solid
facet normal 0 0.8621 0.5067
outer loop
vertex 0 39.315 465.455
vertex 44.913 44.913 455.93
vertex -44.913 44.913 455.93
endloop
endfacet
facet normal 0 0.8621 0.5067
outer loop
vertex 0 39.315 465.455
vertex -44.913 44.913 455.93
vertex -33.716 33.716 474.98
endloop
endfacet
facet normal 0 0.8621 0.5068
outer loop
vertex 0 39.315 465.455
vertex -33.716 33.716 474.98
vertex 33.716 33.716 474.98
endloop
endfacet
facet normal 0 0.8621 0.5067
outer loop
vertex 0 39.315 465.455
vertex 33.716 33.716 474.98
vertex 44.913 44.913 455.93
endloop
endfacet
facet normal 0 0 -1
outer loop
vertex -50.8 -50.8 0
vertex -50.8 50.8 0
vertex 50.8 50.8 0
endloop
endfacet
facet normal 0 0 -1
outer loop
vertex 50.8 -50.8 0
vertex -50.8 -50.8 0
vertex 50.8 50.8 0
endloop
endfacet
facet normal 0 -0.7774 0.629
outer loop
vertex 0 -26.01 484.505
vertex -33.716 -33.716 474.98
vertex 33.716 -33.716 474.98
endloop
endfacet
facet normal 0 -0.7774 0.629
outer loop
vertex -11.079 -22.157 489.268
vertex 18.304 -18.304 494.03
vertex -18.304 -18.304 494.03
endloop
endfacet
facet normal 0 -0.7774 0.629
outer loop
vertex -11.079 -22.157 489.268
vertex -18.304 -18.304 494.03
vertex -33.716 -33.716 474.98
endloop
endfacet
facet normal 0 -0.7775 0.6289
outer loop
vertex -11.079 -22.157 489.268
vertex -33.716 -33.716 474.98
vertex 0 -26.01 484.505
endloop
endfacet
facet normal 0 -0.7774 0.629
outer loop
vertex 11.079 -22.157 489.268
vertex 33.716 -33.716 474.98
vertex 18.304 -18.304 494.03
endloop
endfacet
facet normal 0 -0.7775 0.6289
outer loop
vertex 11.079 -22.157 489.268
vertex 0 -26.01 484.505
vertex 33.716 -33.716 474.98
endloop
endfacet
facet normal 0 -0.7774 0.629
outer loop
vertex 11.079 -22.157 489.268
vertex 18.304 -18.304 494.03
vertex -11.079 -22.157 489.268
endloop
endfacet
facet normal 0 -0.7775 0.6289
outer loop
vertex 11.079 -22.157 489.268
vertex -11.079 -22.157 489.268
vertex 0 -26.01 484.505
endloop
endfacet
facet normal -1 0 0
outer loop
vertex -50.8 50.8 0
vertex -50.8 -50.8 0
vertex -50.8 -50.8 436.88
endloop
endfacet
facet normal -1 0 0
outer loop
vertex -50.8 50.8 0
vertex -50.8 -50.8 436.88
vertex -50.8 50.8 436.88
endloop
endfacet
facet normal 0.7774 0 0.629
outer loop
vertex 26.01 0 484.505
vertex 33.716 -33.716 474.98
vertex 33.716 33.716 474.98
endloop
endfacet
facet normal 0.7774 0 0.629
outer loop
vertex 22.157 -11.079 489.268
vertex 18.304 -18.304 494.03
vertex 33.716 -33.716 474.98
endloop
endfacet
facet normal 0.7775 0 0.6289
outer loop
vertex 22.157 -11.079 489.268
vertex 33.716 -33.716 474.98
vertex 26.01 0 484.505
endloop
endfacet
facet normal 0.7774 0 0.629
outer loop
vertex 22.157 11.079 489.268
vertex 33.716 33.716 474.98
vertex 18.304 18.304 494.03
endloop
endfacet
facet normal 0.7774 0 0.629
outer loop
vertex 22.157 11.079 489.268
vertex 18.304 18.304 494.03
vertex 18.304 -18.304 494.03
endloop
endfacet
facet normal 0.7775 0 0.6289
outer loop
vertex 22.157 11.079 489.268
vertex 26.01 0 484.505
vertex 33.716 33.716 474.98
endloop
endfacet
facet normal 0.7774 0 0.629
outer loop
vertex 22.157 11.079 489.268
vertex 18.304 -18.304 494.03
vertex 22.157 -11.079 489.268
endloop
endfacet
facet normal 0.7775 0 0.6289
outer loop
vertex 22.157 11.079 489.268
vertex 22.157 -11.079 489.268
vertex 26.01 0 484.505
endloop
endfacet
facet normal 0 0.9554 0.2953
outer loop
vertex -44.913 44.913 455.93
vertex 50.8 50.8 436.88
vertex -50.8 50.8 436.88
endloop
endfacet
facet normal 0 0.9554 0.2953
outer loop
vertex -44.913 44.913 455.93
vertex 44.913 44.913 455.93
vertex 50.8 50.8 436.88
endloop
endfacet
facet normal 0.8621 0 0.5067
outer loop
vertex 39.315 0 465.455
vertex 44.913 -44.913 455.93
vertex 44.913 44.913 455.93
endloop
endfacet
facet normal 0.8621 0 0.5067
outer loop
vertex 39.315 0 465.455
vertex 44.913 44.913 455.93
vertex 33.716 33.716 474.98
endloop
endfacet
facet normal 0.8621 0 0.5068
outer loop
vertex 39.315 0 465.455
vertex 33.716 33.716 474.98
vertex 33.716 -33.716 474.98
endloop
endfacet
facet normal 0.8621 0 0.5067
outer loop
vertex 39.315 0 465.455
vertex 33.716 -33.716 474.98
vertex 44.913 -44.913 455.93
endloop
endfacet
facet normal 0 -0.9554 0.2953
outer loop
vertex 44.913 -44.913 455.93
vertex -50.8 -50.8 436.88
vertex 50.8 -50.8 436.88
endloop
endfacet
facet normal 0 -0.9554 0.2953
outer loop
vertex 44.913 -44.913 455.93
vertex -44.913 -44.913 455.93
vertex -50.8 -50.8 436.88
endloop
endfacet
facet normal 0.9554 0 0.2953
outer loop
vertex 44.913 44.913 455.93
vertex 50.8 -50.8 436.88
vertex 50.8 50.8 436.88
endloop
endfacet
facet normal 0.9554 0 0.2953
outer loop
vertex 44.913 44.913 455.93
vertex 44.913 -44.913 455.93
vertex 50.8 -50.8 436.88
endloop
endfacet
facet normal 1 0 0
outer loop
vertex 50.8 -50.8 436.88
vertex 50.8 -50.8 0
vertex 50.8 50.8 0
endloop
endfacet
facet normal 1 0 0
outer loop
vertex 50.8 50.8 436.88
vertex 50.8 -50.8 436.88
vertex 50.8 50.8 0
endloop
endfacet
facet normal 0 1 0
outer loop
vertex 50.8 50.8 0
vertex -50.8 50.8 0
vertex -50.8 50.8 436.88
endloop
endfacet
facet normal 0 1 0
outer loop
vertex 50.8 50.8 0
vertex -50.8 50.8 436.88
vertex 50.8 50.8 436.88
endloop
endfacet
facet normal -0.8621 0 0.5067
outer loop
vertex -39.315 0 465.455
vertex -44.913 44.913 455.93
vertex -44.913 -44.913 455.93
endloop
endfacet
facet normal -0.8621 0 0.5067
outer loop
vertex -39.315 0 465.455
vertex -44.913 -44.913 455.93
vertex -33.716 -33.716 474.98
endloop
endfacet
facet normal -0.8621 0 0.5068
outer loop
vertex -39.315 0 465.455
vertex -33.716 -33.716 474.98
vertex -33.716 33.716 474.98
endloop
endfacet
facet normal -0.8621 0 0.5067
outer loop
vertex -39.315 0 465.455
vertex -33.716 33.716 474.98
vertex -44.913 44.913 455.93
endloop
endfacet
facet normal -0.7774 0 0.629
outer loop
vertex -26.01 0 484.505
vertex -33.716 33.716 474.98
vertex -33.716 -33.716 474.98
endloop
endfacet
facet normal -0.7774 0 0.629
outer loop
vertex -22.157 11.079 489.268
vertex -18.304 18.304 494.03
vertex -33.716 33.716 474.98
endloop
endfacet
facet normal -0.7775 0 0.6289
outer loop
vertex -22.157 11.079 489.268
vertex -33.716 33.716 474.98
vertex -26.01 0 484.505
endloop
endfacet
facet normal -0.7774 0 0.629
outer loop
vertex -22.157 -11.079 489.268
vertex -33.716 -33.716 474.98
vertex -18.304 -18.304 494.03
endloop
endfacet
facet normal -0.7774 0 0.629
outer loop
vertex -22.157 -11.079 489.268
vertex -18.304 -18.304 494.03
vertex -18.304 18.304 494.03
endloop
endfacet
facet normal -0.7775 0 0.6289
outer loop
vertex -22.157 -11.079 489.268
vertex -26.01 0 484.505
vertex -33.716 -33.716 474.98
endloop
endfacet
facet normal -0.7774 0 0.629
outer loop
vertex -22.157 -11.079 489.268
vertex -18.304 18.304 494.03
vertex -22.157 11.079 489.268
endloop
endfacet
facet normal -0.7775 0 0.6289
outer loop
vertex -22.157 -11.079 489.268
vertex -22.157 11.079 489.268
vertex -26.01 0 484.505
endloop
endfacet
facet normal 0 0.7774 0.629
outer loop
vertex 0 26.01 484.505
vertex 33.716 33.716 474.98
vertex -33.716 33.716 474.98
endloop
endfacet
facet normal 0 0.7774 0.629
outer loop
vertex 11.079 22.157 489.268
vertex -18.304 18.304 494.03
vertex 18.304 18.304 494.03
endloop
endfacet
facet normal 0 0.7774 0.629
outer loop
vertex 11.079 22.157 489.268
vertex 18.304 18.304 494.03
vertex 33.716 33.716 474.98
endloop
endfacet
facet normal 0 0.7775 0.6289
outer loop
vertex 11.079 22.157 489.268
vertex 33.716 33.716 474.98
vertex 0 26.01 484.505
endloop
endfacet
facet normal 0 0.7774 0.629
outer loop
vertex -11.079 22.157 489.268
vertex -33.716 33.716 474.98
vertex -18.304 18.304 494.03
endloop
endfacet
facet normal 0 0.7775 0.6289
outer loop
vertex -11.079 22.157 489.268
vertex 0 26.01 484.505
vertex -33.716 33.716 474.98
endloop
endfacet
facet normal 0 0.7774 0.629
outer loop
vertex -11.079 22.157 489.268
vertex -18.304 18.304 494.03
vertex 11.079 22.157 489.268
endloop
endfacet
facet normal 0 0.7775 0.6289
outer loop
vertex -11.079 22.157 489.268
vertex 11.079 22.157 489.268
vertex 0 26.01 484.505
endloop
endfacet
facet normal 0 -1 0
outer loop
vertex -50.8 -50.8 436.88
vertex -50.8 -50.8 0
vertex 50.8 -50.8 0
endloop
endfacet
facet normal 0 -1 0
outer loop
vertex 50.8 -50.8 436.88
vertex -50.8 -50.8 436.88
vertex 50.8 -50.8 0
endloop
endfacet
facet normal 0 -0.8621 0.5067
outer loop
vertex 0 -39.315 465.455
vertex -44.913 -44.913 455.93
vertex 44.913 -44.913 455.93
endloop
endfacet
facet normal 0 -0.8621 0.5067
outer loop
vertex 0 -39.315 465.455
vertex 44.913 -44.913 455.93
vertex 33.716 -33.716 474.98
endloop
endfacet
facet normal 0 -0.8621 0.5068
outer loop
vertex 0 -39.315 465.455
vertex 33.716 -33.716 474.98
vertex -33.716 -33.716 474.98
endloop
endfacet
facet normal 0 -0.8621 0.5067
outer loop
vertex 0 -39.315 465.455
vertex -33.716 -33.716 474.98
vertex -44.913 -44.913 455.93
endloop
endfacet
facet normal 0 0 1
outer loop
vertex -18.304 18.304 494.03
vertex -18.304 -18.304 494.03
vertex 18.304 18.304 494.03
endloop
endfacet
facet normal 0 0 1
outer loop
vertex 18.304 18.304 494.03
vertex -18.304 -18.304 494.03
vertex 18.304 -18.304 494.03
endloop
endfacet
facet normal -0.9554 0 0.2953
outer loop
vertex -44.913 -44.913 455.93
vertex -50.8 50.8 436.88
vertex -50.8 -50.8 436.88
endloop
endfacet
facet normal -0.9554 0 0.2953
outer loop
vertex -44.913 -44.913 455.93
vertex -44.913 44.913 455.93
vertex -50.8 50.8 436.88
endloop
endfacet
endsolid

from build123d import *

# Parameters (mm, degrees)
SKETCH1_W           = 101.6
SKETCH1_H           = 101.6
BOSS_EXTRUDE1_DEPTH = 436.88


with BuildPart() as part:
    # Sketch1 → Boss-Extrude1 (new body)
    with BuildSketch(Plane.XY):
        Rectangle(SKETCH1_W, SKETCH1_H)
    extrude(amount=BOSS_EXTRUDE1_DEPTH)

    # Sketch5 → Loft2 section 0
    with BuildSketch(Plane.XY.offset(436.88)):
        with BuildLine():
            Line((50.8, -50.8), (50.8, 50.8))
            Line((50.8, 50.8), (-50.8, 50.8))
            Line((-50.8, 50.8), (-50.8, -50.8))
            Line((-50.8, -50.8), (50.8, -50.8))
        make_face()
    # Sketch3 → Loft2 section 1
    with BuildSketch(Plane.XY.offset(455.93)):
        with BuildLine():
            Line((-44.913226277, -44.913226277), (44.913226277, -44.913226277))
            Line((44.913226277, -44.913226277), (44.913226277, 44.913226277))
            Line((44.913226277, 44.913226277), (-44.913226277, 44.913226277))
            Line((-44.913226277, 44.913226277), (-44.913226277, -44.913226277))
        make_face()
    loft()

    # Sketch3<6> → Loft3 section 0
    with BuildSketch(Plane.XY.offset(455.93)):
        with BuildLine():
            Line((-44.913226277, -44.913226277), (44.913226277, -44.913226277))
            Line((44.913226277, -44.913226277), (44.913226277, 44.913226277))
            Line((44.913226277, 44.913226277), (-44.913226277, 44.913226277))
            Line((-44.913226277, 44.913226277), (-44.913226277, -44.913226277))
        make_face()
    # Sketch6 → Loft3 section 1
    with BuildSketch(Plane.XY.offset(474.98)):
        with BuildLine():
            Line((-33.715917201, -33.715917221), (33.715917201, -33.715917221))
            Line((33.715917201, -33.715917221), (33.715917201, 33.715917221))
            Line((33.715917201, 33.715917221), (-33.715917201, 33.715917221))
            Line((-33.715917201, 33.715917221), (-33.715917201, -33.715917221))
        make_face()
    loft()

    # Sketch6<4> → Loft4 section 0
    with BuildSketch(Plane.XY.offset(474.98)):
        with BuildLine():
            Line((-33.715917201, -33.715917221), (33.715917201, -33.715917221))
            Line((33.715917201, -33.715917221), (33.715917201, 33.715917221))
            Line((33.715917201, 33.715917221), (-33.715917201, 33.715917221))
            Line((-33.715917201, 33.715917221), (-33.715917201, -33.715917221))
        make_face()
    # Sketch7 → Loft4 section 1
    with BuildSketch(Plane.XY.offset(494.03)):
        with BuildLine():
            Line((-18.304143478, -18.304143458), (18.304143478, -18.304143458))
            Line((18.304143478, -18.304143458), (18.304143478, 18.304143458))
            Line((18.304143478, 18.304143458), (-18.304143478, 18.304143458))
            Line((-18.304143478, 18.304143458), (-18.304143478, -18.304143458))
        make_face()
    loft()


solid = part.part
